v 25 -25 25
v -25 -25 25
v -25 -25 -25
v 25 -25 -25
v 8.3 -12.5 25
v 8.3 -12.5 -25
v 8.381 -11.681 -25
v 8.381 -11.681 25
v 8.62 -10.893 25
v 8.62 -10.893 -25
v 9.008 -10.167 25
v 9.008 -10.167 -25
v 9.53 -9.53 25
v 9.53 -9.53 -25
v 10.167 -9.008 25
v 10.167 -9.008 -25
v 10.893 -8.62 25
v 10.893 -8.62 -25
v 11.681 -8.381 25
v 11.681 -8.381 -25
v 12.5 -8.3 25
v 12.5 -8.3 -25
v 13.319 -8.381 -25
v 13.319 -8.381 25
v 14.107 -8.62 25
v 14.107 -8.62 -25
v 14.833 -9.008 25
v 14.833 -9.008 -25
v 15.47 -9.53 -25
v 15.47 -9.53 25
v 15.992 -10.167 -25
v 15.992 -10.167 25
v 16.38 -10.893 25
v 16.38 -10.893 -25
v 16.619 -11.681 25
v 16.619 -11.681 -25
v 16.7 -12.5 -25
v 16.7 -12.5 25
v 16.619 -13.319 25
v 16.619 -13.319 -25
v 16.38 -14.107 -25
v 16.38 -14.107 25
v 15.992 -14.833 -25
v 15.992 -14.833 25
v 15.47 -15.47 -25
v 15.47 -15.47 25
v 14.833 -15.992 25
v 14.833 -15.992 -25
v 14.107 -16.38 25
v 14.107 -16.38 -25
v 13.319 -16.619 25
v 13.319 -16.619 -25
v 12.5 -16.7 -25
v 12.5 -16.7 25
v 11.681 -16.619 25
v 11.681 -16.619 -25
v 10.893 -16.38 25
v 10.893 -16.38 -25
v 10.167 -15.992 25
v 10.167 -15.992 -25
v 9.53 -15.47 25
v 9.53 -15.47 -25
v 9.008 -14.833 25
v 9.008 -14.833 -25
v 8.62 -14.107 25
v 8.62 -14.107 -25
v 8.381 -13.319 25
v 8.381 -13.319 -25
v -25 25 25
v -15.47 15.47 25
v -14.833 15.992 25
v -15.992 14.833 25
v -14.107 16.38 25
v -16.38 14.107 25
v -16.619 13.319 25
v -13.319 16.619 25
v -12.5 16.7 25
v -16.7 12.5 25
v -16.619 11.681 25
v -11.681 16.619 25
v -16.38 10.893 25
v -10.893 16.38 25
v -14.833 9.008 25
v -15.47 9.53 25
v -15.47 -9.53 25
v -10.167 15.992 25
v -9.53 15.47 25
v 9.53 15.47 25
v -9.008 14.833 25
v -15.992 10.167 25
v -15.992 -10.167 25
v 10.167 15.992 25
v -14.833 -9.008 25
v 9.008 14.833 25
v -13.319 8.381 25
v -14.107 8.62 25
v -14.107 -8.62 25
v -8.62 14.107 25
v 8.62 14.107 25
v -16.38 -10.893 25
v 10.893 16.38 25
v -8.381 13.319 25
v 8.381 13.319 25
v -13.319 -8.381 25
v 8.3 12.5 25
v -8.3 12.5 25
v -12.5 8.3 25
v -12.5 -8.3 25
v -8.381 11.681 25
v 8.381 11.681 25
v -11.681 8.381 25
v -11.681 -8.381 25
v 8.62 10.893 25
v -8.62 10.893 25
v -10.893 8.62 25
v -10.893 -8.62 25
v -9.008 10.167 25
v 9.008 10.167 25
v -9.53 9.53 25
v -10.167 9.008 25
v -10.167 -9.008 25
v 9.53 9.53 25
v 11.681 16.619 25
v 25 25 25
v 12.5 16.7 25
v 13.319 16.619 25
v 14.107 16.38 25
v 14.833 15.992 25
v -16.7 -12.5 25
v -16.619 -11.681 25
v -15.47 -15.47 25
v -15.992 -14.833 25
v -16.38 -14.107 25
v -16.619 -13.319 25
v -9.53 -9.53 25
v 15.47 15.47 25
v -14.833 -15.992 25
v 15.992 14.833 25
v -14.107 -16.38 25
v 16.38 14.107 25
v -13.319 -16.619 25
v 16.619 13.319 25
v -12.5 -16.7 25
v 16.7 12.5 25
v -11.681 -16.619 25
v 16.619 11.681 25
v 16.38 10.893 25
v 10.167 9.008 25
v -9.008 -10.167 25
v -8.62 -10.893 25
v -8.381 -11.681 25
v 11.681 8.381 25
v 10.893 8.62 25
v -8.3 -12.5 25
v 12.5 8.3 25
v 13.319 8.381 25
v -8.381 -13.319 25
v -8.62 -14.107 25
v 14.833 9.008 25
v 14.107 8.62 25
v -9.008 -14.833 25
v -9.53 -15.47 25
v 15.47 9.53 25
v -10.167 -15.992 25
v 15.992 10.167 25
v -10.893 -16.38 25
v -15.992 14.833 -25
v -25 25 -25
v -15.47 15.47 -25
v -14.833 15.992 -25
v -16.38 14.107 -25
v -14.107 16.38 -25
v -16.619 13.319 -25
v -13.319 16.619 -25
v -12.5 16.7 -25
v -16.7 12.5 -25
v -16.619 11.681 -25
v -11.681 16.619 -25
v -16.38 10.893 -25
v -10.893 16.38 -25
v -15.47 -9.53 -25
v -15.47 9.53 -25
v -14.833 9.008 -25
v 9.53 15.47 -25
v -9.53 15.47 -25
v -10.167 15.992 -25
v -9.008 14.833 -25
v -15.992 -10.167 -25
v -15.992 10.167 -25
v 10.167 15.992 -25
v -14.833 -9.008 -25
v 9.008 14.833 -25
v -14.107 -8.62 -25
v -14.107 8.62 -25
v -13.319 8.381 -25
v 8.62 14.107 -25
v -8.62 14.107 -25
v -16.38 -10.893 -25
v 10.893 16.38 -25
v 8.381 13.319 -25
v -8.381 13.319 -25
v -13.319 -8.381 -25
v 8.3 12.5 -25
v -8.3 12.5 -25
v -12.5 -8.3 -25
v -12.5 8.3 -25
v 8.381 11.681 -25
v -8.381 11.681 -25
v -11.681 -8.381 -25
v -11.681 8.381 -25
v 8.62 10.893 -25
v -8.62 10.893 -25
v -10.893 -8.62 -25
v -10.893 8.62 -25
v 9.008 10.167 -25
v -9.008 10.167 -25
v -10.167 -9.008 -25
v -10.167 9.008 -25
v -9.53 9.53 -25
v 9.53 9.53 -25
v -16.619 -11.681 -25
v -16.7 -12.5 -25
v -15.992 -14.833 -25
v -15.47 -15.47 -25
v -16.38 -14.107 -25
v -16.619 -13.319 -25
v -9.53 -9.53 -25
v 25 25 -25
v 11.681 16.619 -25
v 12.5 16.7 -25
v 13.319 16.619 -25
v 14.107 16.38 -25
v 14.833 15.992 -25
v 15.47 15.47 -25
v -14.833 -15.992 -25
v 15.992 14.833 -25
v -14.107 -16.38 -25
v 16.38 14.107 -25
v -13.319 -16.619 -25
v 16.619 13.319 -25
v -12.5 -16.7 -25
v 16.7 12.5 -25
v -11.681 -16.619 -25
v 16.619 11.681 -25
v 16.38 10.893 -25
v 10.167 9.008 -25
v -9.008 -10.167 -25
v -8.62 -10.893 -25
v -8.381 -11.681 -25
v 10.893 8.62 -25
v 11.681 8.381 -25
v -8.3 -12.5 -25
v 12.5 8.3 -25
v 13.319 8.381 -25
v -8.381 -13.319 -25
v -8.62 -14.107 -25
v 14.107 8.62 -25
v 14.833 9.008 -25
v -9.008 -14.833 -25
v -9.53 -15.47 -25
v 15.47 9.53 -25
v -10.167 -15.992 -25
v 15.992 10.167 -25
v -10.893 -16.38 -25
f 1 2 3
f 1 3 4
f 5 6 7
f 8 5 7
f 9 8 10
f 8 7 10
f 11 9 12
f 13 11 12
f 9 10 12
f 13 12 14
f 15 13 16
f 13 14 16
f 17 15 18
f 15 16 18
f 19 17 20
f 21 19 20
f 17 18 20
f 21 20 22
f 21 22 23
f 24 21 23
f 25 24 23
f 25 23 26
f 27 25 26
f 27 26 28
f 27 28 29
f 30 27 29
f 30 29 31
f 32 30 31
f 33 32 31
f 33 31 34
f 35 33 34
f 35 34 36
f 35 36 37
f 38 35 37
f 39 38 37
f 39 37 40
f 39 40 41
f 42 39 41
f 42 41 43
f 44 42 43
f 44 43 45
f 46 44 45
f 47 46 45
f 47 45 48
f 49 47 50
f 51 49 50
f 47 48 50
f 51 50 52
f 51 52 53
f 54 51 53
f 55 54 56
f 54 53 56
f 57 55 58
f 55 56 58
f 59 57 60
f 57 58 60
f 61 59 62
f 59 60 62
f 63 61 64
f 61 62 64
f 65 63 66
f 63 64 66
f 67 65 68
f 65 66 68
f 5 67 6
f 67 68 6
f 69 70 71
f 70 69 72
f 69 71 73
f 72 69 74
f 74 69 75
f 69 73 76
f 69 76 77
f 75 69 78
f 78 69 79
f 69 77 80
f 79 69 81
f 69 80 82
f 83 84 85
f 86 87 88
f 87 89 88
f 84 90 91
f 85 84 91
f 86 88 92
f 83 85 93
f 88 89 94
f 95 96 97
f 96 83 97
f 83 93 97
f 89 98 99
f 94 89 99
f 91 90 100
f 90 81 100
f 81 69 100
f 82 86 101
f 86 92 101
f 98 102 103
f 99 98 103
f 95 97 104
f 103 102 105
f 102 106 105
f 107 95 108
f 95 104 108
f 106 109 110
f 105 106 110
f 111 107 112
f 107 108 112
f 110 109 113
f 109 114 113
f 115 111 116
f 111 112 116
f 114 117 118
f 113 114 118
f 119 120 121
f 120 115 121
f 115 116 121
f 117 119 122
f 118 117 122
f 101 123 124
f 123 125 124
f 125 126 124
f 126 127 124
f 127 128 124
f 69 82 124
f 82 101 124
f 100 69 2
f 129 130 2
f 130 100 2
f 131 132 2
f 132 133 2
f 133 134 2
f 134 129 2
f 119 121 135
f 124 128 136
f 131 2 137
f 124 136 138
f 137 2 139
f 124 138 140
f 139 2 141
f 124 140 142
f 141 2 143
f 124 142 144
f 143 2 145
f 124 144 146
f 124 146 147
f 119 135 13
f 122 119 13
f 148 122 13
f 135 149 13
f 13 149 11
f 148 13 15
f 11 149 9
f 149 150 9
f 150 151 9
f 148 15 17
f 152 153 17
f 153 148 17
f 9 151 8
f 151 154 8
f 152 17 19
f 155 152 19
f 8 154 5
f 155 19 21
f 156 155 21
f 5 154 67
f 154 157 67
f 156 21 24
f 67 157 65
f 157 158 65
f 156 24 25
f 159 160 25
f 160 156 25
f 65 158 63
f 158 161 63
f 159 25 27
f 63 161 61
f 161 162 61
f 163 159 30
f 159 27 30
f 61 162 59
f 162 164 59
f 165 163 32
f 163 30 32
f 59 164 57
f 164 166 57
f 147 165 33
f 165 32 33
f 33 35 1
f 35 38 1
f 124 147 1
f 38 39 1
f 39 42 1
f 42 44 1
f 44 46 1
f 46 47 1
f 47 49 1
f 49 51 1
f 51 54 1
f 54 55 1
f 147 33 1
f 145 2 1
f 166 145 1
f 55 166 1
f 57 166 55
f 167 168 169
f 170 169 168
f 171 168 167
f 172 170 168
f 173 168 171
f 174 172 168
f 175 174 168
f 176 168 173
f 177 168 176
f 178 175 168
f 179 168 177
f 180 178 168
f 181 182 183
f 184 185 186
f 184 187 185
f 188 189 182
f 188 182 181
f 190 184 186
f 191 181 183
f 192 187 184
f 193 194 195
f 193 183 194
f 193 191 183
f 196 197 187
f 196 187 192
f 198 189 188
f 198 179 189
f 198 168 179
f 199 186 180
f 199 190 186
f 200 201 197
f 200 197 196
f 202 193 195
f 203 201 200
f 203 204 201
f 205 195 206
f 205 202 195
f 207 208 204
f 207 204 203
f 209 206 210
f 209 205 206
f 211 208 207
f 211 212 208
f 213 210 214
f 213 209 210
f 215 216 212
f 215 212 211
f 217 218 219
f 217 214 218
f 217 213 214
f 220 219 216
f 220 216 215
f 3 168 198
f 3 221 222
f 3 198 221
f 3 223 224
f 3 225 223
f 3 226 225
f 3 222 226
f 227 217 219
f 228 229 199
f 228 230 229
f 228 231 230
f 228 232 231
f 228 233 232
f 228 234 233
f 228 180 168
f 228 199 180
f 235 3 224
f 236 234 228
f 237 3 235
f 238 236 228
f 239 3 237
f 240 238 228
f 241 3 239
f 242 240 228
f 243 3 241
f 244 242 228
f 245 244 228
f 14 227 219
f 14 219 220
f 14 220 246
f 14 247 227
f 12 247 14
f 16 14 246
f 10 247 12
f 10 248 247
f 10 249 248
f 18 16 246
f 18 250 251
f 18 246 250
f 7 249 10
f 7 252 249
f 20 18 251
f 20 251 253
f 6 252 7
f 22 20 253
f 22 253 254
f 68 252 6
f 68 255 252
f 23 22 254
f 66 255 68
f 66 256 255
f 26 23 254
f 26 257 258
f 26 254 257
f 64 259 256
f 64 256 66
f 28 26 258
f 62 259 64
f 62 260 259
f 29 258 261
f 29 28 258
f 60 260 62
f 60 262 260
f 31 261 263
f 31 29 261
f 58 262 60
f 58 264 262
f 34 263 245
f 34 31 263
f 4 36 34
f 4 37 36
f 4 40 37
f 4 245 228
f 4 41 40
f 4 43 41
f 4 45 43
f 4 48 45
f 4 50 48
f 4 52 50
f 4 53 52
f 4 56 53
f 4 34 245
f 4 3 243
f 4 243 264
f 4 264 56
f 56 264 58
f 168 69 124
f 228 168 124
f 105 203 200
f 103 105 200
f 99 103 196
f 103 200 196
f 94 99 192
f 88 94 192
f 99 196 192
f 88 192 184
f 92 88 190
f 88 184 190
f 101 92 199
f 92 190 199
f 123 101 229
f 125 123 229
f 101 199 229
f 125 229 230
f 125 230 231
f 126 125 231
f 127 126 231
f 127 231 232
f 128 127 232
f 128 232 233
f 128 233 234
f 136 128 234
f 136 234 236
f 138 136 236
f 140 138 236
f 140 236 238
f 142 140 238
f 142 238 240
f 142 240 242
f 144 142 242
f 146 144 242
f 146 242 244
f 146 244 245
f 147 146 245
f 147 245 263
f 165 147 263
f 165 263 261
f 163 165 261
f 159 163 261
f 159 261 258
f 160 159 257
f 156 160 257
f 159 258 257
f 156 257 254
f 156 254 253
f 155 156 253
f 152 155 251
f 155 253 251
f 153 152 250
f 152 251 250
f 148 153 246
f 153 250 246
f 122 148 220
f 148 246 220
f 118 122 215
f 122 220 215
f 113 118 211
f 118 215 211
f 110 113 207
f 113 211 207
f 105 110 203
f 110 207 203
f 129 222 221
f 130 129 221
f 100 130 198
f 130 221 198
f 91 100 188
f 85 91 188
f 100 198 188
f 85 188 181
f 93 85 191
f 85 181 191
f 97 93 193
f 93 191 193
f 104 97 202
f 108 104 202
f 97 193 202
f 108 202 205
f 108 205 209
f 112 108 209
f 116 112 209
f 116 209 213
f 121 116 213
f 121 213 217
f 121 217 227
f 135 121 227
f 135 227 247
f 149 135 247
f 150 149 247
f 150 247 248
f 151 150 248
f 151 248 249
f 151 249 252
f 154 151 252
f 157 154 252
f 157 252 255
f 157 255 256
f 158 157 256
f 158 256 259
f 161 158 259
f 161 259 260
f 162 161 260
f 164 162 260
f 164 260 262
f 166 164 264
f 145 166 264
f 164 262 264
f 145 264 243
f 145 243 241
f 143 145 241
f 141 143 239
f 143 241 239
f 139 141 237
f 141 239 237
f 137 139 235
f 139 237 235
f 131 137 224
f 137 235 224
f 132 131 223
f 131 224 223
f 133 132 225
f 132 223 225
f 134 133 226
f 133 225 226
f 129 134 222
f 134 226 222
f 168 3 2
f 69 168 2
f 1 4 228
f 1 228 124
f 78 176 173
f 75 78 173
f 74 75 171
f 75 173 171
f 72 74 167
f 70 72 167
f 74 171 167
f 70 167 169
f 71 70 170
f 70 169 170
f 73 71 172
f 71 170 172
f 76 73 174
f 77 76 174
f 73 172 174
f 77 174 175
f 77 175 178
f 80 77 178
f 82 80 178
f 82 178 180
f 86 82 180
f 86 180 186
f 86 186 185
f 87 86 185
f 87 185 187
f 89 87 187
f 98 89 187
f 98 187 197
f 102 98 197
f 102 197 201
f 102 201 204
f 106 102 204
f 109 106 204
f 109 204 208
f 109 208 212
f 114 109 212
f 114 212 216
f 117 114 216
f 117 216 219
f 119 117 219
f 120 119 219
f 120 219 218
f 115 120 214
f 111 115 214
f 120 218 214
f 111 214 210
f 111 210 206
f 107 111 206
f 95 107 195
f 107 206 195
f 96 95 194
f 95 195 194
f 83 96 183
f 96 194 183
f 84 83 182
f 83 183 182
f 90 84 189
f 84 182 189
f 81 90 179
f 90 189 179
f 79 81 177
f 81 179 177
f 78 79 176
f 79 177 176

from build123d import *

# Parameters (mm, degrees)
F0_W     = 50
F0_H     = 50
F1_DEPTH = 25
F3_D     = 8.4


with BuildPart() as f1:
    # F0 (on Front) → F1 (new body, symmetric)
    with BuildSketch(Plane.XZ):
        Rectangle(F0_W, F0_H)
    extrude(amount=F1_DEPTH, both=True)

    # F3 (through all)
    with Locations(Plane.XY.offset(25)):
        with Locations((-12.5, 12.5), (12.5, 12.5), (12.5, -12.5), (-12.5, -12.5)):
            Hole(F3_D / 2)


solid = f1.part
